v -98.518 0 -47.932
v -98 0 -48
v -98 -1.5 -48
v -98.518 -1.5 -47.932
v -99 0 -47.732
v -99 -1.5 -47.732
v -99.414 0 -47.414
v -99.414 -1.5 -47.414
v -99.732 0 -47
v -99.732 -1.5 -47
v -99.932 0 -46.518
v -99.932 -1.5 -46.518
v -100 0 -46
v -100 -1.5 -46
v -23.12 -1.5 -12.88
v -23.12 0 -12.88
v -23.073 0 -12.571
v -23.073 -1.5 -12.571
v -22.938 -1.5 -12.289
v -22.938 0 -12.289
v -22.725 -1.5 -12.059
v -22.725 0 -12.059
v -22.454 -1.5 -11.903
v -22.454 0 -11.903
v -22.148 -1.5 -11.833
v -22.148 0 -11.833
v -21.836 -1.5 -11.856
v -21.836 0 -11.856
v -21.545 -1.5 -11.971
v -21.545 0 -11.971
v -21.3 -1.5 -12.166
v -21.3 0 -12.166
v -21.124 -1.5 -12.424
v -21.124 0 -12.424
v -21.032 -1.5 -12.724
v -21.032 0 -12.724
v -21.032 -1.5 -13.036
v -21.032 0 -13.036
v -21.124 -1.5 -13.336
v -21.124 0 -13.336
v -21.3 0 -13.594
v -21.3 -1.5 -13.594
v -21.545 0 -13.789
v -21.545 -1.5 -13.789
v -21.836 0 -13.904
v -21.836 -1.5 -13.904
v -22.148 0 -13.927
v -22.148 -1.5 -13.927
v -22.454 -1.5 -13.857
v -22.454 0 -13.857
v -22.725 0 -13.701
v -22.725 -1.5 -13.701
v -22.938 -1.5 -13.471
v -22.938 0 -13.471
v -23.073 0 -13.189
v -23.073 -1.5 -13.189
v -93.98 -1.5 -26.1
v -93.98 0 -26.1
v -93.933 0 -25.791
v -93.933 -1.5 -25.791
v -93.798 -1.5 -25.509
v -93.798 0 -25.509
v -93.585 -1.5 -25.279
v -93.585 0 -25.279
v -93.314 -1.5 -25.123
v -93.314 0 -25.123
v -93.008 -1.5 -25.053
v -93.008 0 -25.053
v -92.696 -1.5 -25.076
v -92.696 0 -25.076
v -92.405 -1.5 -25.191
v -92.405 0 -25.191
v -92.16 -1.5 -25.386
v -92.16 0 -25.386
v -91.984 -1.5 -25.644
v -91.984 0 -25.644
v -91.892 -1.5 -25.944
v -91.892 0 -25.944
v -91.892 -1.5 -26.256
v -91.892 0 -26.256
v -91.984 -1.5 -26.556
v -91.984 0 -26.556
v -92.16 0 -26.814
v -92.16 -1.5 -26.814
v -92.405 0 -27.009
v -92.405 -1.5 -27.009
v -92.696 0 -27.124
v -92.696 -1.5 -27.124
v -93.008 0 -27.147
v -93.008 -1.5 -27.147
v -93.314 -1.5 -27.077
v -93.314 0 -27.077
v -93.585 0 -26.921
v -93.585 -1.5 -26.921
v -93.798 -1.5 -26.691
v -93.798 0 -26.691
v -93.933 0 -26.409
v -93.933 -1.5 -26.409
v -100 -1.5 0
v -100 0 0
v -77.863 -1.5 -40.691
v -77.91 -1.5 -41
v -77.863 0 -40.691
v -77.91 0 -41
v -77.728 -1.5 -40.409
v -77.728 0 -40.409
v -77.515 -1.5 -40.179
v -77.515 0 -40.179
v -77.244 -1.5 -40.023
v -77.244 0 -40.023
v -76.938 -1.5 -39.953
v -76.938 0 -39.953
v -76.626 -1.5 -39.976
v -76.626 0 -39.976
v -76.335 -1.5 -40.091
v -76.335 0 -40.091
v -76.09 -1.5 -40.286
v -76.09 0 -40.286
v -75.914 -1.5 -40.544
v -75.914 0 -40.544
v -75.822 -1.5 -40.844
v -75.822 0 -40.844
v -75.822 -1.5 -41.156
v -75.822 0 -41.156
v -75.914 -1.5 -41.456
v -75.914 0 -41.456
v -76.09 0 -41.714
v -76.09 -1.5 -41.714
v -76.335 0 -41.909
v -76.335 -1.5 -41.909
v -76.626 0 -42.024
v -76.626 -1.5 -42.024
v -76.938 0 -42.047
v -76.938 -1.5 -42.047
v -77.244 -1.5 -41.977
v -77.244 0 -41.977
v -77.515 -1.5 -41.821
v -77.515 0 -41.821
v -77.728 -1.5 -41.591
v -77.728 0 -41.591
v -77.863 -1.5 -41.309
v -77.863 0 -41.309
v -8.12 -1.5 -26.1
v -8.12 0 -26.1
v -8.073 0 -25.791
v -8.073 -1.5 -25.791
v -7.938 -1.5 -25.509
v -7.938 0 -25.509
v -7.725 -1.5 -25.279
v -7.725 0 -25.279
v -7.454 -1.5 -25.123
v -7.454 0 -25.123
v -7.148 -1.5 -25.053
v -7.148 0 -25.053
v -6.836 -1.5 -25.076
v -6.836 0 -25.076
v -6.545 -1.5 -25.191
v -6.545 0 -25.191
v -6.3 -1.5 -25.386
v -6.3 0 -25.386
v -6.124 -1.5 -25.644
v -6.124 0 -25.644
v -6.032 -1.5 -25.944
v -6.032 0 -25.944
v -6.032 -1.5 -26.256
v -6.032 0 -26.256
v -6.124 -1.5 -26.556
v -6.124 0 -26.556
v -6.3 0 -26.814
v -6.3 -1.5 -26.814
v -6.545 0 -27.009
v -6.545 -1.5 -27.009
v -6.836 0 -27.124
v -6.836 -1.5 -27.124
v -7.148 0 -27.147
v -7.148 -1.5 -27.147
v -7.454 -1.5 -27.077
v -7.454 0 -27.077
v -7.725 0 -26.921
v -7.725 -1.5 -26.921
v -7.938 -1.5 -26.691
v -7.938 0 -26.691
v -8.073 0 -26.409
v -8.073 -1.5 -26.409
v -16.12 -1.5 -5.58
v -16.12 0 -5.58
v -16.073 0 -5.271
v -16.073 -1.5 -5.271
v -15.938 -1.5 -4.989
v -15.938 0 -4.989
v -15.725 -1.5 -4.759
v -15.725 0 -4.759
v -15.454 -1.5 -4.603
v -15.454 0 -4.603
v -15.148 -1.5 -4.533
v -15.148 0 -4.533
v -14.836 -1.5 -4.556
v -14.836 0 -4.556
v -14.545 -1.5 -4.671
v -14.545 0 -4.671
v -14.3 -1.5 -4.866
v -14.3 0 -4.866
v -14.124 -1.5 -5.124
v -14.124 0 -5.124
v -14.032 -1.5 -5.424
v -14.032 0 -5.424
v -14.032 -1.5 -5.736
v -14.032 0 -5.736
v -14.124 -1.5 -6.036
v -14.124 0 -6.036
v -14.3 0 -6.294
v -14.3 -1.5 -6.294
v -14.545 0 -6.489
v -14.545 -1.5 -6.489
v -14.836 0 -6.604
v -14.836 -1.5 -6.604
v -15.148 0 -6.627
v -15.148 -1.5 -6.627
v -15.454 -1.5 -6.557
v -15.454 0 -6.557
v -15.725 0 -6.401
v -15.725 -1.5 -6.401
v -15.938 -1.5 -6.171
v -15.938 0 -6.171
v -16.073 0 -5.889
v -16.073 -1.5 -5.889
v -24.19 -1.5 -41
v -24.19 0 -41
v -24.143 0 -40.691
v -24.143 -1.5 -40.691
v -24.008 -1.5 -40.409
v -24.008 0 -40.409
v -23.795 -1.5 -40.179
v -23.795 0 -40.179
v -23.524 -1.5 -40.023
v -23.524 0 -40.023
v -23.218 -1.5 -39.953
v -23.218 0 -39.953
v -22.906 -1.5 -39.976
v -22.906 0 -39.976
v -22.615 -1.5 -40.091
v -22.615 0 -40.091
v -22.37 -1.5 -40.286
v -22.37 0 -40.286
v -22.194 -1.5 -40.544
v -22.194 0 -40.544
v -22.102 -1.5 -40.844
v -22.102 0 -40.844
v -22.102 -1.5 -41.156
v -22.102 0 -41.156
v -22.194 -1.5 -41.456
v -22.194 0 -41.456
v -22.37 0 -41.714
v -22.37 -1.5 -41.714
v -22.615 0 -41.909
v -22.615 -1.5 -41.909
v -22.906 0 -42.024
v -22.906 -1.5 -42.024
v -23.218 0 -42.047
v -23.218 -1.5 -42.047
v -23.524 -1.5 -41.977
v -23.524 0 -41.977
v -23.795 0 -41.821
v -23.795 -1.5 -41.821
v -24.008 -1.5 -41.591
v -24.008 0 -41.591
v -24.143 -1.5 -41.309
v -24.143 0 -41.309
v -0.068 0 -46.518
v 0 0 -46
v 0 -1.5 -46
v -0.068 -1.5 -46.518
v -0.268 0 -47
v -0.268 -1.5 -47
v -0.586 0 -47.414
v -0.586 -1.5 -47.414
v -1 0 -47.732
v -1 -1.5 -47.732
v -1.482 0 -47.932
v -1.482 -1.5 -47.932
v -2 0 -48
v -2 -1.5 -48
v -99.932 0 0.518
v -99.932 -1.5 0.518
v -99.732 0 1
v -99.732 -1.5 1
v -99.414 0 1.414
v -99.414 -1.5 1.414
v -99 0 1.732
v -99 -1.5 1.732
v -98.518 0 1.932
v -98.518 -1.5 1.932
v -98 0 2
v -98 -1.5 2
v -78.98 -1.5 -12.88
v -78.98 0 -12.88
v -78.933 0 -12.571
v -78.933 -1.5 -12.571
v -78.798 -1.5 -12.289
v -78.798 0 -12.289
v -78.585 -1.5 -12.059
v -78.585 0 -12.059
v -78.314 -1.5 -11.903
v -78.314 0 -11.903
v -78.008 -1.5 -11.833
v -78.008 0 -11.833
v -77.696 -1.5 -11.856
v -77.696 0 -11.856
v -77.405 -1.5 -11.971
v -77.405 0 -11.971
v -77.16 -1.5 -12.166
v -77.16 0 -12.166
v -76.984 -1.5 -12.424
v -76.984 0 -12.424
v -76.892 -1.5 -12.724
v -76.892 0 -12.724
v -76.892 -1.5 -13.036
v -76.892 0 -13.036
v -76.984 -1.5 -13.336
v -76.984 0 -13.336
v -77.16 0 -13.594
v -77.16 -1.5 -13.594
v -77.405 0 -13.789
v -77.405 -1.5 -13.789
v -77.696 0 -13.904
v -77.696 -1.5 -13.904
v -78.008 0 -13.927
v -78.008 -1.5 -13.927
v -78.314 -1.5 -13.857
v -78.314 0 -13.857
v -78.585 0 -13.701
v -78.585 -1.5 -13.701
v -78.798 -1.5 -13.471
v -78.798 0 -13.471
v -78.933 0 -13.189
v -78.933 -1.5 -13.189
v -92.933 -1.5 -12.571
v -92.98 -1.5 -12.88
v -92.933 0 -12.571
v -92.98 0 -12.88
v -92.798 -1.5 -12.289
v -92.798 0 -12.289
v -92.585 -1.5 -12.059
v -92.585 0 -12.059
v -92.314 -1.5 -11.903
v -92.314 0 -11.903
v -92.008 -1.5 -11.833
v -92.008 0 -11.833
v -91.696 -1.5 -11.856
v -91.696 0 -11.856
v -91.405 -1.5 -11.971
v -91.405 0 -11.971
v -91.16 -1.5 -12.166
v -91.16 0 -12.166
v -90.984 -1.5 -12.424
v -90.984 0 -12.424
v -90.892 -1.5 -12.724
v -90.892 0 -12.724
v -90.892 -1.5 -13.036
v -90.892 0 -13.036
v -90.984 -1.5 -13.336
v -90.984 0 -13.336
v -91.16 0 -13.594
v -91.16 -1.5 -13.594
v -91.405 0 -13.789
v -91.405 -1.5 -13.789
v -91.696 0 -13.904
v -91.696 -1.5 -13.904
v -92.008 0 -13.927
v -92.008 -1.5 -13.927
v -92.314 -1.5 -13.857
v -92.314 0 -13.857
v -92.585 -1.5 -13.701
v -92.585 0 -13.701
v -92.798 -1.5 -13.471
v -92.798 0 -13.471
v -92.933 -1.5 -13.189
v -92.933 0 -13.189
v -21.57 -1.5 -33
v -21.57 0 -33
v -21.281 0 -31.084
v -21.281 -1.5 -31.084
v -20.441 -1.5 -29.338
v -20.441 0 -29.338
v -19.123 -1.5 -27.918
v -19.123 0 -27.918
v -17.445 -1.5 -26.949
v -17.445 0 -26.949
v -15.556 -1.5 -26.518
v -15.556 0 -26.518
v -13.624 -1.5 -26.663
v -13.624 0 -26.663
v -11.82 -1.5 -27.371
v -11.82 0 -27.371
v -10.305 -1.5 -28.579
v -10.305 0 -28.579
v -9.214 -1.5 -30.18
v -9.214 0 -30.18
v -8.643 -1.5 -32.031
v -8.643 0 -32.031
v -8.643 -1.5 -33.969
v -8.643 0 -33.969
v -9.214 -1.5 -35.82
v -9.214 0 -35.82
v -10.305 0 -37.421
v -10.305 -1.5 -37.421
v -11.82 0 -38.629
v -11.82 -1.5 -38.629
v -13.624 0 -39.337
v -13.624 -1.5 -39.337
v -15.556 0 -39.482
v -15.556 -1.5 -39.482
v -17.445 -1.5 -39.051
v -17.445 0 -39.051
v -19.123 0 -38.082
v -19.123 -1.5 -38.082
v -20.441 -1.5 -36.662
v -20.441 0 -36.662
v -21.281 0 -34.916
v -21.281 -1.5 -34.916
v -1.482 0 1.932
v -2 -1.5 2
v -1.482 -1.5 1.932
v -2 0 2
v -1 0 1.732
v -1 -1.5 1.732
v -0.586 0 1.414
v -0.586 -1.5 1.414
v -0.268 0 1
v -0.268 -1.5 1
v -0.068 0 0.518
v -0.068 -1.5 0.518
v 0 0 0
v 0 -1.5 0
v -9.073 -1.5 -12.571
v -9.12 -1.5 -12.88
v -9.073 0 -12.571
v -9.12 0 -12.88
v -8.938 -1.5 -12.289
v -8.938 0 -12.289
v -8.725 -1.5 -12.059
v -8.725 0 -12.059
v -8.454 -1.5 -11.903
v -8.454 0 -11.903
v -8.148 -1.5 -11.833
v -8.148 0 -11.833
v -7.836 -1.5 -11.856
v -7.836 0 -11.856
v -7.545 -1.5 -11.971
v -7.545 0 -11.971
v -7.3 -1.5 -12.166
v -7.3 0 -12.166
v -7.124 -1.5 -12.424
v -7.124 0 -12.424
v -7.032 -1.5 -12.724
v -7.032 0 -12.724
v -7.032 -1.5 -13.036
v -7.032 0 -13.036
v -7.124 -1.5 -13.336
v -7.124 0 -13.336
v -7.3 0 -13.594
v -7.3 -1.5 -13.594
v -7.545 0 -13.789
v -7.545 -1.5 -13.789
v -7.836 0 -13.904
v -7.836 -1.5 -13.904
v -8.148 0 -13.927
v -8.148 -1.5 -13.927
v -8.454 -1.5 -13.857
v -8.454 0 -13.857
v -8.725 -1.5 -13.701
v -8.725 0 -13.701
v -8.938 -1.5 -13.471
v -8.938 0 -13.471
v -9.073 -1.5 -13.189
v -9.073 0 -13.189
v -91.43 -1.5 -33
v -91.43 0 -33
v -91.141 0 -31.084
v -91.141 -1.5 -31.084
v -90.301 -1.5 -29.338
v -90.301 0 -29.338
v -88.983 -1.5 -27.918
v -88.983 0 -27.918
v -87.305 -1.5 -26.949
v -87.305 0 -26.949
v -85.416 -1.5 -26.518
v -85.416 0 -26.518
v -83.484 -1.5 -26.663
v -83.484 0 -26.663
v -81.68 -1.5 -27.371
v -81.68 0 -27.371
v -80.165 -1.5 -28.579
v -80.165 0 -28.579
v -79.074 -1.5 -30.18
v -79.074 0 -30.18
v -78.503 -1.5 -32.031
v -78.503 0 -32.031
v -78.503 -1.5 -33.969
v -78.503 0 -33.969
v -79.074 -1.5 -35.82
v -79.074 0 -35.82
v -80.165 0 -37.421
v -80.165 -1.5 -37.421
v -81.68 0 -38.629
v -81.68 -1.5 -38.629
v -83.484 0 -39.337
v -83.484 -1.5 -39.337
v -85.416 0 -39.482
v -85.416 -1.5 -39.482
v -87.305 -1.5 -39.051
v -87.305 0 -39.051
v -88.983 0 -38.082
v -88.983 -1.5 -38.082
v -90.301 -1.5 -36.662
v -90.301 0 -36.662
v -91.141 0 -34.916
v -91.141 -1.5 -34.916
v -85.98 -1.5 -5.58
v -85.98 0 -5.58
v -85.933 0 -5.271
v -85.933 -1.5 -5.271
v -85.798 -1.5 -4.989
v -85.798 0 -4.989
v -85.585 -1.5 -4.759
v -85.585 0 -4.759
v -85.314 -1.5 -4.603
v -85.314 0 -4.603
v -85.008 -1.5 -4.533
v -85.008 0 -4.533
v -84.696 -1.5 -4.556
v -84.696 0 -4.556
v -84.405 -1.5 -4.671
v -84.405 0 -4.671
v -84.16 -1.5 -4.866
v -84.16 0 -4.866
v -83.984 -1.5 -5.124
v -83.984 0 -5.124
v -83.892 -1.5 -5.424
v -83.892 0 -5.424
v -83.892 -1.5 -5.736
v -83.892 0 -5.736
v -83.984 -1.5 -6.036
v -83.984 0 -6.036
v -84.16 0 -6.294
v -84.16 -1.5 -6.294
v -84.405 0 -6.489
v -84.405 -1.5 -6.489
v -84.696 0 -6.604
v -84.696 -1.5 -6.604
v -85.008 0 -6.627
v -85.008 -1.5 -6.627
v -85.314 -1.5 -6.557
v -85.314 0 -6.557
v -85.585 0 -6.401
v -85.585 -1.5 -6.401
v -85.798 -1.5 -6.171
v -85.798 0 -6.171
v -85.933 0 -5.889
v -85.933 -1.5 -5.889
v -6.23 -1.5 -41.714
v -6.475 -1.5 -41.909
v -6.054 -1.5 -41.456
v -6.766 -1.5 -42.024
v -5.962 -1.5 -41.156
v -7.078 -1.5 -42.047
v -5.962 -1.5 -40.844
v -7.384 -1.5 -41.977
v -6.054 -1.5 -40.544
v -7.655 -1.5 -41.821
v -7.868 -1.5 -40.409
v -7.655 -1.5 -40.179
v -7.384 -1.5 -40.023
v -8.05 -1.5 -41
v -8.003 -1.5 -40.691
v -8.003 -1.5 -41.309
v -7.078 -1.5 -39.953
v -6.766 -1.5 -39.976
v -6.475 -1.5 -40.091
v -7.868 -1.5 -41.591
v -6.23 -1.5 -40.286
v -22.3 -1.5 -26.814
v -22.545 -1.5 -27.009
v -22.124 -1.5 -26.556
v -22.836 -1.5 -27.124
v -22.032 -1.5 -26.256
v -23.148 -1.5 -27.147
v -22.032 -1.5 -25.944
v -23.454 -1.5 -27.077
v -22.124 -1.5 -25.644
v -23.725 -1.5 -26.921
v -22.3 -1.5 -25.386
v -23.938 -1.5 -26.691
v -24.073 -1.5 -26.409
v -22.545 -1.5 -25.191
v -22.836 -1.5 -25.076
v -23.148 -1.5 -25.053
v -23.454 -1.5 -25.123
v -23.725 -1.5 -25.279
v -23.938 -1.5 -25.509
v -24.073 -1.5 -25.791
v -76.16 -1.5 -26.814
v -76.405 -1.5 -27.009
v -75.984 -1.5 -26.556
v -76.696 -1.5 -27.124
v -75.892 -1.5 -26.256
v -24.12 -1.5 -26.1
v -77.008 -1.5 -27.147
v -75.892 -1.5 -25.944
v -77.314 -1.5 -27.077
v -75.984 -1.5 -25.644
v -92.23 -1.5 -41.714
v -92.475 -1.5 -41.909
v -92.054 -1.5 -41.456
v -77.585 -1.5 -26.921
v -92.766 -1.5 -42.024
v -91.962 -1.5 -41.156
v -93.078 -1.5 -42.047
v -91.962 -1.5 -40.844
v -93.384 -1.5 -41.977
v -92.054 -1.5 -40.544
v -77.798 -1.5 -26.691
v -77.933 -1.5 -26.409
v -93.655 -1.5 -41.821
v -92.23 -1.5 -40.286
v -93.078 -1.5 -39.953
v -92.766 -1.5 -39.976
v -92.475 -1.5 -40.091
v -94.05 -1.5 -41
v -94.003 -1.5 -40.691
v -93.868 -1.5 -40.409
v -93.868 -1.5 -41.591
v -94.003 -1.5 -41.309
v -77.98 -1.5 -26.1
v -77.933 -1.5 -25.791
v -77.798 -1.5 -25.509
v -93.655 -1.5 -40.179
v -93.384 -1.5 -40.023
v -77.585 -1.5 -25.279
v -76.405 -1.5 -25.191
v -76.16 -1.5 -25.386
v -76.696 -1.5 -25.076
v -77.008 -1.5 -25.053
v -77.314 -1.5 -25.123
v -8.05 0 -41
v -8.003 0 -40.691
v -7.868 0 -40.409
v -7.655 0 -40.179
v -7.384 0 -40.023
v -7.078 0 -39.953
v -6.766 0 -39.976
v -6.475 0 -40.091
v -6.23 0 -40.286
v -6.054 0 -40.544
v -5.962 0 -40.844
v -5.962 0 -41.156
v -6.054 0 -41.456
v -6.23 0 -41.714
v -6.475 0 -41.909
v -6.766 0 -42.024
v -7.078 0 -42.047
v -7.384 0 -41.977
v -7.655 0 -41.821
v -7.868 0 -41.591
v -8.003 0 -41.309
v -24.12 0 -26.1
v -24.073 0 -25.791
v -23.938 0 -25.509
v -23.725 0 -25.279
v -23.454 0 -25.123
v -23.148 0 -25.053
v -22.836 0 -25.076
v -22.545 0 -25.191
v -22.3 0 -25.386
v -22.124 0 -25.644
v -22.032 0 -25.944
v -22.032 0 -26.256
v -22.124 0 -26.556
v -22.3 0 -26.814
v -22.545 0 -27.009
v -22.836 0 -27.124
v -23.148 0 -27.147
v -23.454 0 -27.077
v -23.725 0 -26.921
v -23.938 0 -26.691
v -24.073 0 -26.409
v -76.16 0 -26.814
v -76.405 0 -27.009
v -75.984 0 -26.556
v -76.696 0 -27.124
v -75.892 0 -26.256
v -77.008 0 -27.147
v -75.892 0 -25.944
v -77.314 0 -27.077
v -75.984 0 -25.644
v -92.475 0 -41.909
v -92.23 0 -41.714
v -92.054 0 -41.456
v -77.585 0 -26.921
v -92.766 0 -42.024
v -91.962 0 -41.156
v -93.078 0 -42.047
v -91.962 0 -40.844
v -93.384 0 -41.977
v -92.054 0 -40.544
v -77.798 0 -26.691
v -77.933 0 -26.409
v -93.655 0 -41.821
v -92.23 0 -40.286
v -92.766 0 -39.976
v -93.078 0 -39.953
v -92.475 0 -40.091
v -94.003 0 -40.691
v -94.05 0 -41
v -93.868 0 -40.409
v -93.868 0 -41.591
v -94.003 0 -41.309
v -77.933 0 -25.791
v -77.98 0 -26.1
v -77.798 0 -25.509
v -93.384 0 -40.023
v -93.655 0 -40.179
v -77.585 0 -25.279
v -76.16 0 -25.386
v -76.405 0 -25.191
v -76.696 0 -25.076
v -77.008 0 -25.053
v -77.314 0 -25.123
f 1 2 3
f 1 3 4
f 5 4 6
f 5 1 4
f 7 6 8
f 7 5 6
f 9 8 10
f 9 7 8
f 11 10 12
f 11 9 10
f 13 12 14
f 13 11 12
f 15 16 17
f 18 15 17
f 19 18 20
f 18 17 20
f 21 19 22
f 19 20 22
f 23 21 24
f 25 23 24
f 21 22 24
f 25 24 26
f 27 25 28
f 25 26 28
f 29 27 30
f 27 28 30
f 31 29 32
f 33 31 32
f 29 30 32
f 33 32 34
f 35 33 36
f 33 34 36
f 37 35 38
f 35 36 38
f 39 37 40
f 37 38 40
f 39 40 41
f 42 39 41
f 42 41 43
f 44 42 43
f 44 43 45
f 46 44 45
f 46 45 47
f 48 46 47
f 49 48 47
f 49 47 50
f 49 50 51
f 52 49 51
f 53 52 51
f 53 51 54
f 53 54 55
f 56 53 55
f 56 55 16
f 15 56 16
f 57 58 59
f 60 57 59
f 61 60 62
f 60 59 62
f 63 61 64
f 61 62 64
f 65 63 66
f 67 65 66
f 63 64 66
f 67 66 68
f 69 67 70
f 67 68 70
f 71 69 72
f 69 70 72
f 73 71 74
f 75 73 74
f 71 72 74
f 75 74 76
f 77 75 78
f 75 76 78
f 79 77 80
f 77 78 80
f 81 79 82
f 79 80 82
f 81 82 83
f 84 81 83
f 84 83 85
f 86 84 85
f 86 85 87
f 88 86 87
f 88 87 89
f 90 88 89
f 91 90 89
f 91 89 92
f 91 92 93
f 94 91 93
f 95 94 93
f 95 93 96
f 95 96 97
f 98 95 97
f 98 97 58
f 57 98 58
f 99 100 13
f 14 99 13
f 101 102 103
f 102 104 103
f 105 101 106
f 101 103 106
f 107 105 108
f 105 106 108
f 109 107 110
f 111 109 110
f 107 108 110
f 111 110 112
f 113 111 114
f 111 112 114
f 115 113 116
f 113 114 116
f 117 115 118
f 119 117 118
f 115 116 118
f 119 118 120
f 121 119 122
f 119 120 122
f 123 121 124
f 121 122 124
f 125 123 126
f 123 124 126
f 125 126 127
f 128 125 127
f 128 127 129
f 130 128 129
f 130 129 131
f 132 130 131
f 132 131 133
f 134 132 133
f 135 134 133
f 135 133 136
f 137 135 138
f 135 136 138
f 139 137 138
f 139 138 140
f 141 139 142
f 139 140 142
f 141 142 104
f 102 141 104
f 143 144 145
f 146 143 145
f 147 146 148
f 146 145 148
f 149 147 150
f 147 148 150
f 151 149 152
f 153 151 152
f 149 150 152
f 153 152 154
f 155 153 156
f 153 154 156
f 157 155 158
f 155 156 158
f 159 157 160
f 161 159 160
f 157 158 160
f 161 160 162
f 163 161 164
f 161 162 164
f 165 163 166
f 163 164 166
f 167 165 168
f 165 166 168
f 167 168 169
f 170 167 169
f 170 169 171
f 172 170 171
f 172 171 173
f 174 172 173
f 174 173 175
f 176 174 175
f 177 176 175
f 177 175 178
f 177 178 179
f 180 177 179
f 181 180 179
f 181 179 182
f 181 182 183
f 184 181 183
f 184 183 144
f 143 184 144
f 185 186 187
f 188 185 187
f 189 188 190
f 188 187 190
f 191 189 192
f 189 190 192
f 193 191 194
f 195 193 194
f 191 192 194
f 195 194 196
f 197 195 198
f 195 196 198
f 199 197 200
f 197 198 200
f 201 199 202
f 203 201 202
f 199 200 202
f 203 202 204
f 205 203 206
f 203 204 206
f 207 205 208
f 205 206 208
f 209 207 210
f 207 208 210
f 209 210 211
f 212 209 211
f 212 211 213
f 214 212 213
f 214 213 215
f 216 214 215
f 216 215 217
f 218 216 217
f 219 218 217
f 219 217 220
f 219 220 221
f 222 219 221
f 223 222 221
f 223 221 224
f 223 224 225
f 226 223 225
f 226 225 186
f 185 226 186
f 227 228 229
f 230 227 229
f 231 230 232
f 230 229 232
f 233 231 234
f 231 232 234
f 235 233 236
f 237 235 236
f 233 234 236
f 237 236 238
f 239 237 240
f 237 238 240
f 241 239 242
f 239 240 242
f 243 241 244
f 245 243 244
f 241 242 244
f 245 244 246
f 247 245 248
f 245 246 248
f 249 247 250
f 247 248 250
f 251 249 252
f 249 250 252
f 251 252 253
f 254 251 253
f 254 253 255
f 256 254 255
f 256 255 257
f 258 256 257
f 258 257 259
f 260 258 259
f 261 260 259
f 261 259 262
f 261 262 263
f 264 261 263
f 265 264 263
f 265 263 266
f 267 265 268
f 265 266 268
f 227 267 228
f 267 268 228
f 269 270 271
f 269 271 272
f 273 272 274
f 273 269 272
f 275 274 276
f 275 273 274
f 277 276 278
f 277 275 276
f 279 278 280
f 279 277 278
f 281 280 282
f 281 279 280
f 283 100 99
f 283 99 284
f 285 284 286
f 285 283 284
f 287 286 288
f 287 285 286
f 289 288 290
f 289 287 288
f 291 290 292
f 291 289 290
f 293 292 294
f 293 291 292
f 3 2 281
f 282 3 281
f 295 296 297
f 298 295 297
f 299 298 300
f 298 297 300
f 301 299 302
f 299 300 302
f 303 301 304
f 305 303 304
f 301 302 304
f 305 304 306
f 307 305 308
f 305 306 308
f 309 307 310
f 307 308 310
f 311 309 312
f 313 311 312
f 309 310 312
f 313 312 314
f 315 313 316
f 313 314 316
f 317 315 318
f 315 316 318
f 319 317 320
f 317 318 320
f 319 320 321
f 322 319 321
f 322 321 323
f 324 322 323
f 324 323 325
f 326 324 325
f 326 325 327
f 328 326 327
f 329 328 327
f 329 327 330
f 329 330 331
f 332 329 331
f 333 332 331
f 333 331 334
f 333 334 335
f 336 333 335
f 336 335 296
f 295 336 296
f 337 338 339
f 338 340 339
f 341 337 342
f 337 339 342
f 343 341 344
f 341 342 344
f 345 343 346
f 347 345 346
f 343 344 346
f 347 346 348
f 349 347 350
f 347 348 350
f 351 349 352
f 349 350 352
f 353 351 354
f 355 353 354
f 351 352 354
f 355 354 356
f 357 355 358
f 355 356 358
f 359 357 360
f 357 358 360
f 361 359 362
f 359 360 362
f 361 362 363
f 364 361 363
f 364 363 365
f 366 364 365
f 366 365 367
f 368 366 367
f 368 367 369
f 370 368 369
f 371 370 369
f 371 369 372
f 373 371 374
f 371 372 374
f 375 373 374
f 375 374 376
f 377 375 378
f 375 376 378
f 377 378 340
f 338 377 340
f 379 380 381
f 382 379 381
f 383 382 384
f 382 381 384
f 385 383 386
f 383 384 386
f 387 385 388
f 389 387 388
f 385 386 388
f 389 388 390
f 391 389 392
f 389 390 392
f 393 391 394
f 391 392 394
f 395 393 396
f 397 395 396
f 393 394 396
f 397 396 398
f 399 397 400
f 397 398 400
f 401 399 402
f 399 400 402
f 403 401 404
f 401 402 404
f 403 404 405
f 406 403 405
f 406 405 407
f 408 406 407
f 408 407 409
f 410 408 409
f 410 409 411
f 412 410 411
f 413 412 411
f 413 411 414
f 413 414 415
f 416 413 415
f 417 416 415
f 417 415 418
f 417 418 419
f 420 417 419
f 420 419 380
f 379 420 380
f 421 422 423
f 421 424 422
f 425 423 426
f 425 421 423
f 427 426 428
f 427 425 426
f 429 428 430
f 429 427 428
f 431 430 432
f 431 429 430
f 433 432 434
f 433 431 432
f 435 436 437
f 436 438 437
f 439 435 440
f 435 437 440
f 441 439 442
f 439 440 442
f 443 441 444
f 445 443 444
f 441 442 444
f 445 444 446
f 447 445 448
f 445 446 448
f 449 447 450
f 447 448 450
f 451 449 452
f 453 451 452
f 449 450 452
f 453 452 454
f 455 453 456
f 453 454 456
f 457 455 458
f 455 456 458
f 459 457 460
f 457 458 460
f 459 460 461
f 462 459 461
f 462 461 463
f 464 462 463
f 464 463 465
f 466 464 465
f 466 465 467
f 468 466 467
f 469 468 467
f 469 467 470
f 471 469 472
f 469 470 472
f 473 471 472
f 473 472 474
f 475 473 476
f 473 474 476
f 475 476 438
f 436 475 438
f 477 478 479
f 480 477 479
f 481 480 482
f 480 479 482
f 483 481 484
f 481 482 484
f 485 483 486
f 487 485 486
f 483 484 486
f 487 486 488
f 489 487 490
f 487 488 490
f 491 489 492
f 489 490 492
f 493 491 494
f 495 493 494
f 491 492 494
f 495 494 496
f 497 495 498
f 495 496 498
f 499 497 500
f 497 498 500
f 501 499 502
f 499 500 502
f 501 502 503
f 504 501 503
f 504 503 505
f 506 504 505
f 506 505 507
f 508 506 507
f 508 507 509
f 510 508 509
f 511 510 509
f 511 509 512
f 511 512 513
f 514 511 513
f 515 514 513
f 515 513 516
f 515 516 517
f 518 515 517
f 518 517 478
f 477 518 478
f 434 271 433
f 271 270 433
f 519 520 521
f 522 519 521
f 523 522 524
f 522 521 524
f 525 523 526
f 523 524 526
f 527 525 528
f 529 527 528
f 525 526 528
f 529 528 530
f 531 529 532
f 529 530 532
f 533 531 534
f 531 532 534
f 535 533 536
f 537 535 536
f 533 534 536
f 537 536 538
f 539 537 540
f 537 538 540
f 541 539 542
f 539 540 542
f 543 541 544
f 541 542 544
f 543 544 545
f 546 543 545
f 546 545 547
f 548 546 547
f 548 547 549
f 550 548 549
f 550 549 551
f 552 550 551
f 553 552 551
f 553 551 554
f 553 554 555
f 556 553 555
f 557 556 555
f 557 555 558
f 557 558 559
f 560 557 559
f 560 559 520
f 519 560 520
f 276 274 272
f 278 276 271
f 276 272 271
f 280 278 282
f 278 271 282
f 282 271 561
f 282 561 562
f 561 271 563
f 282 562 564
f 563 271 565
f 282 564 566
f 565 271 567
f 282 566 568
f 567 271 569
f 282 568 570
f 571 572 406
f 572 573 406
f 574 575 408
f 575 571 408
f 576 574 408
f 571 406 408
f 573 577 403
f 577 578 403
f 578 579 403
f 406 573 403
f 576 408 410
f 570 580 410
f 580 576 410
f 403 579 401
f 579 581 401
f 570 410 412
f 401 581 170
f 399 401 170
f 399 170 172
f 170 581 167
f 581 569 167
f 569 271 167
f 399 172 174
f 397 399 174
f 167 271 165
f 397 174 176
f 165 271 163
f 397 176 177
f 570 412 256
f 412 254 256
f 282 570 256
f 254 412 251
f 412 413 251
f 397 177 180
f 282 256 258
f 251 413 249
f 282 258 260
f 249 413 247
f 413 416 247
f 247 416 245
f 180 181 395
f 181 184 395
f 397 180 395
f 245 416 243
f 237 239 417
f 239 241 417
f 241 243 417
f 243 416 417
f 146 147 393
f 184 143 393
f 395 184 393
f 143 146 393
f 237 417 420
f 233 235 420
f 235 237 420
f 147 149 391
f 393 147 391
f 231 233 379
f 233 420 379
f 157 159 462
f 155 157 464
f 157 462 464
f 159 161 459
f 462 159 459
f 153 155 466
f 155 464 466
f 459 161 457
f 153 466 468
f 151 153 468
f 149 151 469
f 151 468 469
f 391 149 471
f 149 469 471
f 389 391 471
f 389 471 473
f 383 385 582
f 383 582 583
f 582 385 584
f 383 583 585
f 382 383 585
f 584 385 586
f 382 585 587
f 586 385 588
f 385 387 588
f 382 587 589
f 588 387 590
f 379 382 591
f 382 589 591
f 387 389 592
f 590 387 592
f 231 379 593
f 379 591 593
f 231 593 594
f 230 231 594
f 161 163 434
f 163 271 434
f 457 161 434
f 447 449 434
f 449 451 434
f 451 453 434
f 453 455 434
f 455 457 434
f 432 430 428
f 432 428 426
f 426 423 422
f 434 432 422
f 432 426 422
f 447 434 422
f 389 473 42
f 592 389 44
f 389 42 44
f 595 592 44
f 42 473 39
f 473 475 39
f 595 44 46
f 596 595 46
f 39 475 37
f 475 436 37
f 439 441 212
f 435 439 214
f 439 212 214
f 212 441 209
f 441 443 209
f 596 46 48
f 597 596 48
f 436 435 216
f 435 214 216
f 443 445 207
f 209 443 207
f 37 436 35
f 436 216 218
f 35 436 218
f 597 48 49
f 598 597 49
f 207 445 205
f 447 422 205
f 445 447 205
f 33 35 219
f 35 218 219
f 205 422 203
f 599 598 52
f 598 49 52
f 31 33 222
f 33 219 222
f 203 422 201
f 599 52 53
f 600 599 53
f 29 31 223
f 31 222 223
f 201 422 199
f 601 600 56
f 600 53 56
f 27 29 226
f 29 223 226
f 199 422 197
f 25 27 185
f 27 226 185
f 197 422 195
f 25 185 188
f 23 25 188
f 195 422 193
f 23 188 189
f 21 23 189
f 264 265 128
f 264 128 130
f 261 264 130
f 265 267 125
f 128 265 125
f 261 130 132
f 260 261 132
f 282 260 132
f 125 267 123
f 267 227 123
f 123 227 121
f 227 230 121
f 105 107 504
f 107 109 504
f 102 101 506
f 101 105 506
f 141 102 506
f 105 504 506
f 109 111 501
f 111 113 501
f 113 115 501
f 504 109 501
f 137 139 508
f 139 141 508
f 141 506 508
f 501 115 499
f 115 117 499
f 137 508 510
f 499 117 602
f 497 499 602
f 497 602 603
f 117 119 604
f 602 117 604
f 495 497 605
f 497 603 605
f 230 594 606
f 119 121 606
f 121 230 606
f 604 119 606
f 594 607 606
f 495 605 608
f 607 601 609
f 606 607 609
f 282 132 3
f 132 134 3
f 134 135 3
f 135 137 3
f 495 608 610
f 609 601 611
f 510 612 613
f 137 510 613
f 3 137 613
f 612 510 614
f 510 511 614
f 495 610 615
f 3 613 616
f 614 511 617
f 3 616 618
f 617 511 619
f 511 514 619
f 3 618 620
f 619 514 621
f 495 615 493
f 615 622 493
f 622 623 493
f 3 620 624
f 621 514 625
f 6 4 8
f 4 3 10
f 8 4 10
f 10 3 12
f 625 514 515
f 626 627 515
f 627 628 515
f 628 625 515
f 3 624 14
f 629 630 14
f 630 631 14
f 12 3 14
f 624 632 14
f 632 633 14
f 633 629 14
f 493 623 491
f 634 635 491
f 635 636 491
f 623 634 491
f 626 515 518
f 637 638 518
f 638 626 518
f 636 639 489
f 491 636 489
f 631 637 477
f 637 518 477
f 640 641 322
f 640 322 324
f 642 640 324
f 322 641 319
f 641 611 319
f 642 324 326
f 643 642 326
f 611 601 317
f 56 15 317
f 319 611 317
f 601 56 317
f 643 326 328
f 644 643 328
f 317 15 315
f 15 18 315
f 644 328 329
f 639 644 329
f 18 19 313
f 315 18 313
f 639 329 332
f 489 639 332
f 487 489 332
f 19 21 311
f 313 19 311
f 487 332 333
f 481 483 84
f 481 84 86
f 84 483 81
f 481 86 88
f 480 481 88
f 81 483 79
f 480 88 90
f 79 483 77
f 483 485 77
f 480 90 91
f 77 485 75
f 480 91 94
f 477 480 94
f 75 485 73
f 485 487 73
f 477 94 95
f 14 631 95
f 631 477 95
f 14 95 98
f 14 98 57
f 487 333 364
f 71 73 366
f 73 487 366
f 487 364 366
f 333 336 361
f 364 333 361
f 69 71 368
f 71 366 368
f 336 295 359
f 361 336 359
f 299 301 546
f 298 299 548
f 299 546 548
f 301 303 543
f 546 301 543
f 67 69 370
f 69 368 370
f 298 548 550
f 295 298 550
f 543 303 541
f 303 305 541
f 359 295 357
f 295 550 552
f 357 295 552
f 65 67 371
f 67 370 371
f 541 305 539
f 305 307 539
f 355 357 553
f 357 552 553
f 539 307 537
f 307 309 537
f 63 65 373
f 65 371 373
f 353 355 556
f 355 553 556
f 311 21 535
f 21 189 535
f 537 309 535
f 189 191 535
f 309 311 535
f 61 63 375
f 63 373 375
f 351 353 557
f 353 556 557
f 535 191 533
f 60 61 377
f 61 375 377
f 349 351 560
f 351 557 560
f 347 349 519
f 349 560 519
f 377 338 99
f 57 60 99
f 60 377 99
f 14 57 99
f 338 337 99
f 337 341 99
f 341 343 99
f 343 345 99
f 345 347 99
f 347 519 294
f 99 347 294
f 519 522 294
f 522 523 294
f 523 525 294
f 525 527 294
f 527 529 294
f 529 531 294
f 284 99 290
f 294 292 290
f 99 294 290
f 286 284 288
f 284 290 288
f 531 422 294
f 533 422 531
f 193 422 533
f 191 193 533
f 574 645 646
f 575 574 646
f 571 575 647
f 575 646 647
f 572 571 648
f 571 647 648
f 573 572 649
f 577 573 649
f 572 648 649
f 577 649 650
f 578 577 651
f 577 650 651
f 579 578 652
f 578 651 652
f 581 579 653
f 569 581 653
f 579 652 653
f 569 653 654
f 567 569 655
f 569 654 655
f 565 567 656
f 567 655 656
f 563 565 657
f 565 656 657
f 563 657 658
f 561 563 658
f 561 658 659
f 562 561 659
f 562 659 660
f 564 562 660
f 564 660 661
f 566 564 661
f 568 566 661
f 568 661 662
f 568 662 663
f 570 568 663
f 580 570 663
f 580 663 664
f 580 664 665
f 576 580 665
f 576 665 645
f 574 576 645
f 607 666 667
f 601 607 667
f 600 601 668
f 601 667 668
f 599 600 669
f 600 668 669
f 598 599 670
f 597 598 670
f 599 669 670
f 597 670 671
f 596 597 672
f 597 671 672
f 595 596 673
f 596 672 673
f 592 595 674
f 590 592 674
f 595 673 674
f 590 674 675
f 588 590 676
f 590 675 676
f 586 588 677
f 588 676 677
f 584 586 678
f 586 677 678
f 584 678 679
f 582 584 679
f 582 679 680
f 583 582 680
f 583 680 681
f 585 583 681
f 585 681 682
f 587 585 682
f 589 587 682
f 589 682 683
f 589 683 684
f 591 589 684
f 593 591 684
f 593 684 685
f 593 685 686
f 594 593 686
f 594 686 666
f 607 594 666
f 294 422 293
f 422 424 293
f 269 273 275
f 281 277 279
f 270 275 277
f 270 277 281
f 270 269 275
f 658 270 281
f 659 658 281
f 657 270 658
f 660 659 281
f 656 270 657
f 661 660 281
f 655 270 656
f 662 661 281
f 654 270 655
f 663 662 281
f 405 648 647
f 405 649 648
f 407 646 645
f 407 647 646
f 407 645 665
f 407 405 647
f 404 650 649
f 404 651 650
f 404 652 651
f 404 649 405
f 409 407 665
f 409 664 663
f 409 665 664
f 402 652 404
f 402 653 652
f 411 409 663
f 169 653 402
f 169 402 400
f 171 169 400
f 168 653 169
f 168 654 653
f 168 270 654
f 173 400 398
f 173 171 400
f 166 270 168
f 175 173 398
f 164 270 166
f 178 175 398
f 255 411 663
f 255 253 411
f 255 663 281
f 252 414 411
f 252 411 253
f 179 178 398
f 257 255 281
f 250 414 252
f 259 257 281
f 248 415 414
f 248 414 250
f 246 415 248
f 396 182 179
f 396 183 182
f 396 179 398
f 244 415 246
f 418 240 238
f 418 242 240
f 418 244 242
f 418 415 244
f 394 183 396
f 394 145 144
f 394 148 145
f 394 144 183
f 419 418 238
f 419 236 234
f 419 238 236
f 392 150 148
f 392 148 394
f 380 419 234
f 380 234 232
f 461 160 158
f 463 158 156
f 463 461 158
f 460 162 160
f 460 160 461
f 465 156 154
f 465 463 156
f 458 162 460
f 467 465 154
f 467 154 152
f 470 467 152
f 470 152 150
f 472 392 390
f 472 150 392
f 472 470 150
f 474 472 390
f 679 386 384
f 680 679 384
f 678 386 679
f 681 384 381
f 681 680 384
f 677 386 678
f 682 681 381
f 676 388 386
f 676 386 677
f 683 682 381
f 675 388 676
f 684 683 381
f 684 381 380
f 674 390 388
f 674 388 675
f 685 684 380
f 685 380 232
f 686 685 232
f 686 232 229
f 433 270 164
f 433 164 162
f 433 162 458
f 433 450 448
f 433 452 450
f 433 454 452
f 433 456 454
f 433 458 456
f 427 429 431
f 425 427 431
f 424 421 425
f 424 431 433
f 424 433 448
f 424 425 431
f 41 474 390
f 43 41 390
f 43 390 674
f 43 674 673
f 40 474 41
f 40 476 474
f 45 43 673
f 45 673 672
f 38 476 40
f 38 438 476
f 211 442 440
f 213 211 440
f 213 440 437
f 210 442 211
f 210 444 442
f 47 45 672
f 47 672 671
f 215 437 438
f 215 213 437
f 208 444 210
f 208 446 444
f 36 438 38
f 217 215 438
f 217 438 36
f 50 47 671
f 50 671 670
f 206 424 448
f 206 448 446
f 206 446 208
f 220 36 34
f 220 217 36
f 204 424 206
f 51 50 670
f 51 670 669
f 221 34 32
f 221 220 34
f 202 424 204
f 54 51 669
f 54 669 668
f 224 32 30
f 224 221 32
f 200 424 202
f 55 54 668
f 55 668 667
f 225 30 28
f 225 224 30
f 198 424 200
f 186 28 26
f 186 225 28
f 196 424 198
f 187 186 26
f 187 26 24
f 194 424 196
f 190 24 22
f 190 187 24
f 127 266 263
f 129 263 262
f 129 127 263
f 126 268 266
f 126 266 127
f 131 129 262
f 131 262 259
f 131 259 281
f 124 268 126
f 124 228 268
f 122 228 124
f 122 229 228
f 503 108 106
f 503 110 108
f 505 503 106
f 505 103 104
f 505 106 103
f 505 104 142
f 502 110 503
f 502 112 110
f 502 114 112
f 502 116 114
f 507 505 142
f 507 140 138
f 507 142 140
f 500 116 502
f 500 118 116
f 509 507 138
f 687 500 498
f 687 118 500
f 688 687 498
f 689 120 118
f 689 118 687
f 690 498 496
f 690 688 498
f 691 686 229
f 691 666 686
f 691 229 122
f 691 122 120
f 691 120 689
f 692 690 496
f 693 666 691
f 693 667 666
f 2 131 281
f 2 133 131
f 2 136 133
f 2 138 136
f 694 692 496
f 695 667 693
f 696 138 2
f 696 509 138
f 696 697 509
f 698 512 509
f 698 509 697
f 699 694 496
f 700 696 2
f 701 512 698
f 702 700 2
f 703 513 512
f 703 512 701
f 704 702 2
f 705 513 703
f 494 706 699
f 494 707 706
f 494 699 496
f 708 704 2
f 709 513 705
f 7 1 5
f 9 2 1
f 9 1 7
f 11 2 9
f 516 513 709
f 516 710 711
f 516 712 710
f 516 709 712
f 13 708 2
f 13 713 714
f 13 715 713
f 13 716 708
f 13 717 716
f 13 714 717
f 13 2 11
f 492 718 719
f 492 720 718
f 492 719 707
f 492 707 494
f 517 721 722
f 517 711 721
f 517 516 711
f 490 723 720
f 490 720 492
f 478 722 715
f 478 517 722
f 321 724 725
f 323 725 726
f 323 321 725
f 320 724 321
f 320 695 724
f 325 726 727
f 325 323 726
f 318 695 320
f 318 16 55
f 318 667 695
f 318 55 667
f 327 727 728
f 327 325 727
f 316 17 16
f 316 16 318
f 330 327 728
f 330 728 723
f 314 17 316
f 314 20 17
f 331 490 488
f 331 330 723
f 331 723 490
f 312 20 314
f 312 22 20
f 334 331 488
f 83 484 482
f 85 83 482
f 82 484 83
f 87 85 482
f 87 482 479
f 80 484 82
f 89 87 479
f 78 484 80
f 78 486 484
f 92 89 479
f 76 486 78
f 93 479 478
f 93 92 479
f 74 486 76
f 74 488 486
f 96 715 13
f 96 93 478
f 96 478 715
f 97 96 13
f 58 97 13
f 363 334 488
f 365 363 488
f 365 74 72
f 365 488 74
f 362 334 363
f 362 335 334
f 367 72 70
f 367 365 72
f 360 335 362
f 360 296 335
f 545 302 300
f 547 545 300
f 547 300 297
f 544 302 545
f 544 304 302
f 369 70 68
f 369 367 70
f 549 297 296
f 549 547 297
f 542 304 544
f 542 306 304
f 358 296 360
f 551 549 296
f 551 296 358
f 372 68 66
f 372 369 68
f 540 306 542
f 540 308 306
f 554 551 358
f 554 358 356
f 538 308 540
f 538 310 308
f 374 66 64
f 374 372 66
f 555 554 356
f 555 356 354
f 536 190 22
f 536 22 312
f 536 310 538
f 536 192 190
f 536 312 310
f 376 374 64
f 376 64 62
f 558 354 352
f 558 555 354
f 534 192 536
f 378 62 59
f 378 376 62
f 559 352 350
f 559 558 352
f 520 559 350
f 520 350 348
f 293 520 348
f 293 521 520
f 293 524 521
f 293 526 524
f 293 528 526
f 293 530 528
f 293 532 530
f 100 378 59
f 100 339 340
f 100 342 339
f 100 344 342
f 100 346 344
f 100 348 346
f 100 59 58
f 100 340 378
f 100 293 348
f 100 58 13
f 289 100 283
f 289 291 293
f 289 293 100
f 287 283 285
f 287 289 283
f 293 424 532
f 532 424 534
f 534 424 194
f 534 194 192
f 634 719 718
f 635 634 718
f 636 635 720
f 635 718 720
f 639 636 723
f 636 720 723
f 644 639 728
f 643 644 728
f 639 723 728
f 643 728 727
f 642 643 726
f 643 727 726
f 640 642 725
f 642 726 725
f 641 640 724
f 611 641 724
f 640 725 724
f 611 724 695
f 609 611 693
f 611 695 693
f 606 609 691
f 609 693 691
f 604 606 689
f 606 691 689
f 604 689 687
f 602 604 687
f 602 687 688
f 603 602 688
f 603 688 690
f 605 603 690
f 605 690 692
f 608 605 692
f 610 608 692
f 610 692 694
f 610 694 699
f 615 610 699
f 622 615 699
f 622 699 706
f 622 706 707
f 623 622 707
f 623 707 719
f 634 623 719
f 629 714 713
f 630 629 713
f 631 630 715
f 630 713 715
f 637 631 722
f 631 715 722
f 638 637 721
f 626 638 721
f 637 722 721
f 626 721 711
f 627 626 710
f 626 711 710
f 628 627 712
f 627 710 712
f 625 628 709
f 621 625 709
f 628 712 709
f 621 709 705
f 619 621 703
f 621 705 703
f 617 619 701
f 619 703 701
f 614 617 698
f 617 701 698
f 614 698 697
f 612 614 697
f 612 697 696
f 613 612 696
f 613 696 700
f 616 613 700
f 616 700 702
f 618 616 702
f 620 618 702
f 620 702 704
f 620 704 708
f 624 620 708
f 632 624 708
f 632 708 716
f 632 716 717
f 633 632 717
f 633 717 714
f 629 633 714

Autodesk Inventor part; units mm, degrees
ref_plane "YZ Plane" through (0, 0, 0) normal (1, 0, 0) x (0, 1, 0)
ref_plane "XZ Plane" through (0, 0, 0) normal (0, 1, 0) x (-1, 0, 0)
ref_plane "XY Plane" through (0, 0, 0) normal (0, 0, 1) x (1, 0, 0)
sketch "Sketch1" plane through (0, 0, 0) normal (0, 1, 0) x (-1, 0, 0)
  circle A0 centre (15.07, -33) radius 6.5
  circle A1 centre (84.93, -33) radius 6.5
  circle A2 centre (15.07, -5.58) radius 1.05
  circle A3 centre (22.07, -12.88) radius 1.05
  circle A4 centre (8.07, -12.88) radius 1.05
  circle A5 centre (23.07, -26.1) radius 1.05
  circle A6 centre (7.07, -26.1) radius 1.05
  circle A7 centre (7, -41) radius 1.05
  circle A8 centre (23.14, -41) radius 1.05
  circle A9 centre (93, -41) radius 1.05
  circle A10 centre (76.86, -41) radius 1.05
  circle A11 centre (76.93, -26.1) radius 1.05
  circle A12 centre (92.93, -26.1) radius 1.05
  circle A13 centre (91.93, -12.88) radius 1.05
  circle A14 centre (77.93, -12.88) radius 1.05
  circle A15 centre (84.93, -5.58) radius 1.05
  arc A16 (100, 0) -> (98, 2) centre (98, 0) ccw
  line L0 (100, 0) -> (100, -46)
  line L1 (2, 2) -> (98, 2)
  arc A17 (2, 2) -> (0, 0) centre (2, 0) ccw
  line L2 (0, -46) -> (0, 0)
  arc A18 (0, -46) -> (2, -48) centre (2, -46) ccw
  line L3 (98, -48) -> (2, -48)
  arc A19 (98, -48) -> (100, -46) centre (98, -46) ccw
  point P0 (0, 0)
extrude "Extrusion1" add sketch "Sketch1" against normal blind 1.5
properties part number "body_bottom_frame"
